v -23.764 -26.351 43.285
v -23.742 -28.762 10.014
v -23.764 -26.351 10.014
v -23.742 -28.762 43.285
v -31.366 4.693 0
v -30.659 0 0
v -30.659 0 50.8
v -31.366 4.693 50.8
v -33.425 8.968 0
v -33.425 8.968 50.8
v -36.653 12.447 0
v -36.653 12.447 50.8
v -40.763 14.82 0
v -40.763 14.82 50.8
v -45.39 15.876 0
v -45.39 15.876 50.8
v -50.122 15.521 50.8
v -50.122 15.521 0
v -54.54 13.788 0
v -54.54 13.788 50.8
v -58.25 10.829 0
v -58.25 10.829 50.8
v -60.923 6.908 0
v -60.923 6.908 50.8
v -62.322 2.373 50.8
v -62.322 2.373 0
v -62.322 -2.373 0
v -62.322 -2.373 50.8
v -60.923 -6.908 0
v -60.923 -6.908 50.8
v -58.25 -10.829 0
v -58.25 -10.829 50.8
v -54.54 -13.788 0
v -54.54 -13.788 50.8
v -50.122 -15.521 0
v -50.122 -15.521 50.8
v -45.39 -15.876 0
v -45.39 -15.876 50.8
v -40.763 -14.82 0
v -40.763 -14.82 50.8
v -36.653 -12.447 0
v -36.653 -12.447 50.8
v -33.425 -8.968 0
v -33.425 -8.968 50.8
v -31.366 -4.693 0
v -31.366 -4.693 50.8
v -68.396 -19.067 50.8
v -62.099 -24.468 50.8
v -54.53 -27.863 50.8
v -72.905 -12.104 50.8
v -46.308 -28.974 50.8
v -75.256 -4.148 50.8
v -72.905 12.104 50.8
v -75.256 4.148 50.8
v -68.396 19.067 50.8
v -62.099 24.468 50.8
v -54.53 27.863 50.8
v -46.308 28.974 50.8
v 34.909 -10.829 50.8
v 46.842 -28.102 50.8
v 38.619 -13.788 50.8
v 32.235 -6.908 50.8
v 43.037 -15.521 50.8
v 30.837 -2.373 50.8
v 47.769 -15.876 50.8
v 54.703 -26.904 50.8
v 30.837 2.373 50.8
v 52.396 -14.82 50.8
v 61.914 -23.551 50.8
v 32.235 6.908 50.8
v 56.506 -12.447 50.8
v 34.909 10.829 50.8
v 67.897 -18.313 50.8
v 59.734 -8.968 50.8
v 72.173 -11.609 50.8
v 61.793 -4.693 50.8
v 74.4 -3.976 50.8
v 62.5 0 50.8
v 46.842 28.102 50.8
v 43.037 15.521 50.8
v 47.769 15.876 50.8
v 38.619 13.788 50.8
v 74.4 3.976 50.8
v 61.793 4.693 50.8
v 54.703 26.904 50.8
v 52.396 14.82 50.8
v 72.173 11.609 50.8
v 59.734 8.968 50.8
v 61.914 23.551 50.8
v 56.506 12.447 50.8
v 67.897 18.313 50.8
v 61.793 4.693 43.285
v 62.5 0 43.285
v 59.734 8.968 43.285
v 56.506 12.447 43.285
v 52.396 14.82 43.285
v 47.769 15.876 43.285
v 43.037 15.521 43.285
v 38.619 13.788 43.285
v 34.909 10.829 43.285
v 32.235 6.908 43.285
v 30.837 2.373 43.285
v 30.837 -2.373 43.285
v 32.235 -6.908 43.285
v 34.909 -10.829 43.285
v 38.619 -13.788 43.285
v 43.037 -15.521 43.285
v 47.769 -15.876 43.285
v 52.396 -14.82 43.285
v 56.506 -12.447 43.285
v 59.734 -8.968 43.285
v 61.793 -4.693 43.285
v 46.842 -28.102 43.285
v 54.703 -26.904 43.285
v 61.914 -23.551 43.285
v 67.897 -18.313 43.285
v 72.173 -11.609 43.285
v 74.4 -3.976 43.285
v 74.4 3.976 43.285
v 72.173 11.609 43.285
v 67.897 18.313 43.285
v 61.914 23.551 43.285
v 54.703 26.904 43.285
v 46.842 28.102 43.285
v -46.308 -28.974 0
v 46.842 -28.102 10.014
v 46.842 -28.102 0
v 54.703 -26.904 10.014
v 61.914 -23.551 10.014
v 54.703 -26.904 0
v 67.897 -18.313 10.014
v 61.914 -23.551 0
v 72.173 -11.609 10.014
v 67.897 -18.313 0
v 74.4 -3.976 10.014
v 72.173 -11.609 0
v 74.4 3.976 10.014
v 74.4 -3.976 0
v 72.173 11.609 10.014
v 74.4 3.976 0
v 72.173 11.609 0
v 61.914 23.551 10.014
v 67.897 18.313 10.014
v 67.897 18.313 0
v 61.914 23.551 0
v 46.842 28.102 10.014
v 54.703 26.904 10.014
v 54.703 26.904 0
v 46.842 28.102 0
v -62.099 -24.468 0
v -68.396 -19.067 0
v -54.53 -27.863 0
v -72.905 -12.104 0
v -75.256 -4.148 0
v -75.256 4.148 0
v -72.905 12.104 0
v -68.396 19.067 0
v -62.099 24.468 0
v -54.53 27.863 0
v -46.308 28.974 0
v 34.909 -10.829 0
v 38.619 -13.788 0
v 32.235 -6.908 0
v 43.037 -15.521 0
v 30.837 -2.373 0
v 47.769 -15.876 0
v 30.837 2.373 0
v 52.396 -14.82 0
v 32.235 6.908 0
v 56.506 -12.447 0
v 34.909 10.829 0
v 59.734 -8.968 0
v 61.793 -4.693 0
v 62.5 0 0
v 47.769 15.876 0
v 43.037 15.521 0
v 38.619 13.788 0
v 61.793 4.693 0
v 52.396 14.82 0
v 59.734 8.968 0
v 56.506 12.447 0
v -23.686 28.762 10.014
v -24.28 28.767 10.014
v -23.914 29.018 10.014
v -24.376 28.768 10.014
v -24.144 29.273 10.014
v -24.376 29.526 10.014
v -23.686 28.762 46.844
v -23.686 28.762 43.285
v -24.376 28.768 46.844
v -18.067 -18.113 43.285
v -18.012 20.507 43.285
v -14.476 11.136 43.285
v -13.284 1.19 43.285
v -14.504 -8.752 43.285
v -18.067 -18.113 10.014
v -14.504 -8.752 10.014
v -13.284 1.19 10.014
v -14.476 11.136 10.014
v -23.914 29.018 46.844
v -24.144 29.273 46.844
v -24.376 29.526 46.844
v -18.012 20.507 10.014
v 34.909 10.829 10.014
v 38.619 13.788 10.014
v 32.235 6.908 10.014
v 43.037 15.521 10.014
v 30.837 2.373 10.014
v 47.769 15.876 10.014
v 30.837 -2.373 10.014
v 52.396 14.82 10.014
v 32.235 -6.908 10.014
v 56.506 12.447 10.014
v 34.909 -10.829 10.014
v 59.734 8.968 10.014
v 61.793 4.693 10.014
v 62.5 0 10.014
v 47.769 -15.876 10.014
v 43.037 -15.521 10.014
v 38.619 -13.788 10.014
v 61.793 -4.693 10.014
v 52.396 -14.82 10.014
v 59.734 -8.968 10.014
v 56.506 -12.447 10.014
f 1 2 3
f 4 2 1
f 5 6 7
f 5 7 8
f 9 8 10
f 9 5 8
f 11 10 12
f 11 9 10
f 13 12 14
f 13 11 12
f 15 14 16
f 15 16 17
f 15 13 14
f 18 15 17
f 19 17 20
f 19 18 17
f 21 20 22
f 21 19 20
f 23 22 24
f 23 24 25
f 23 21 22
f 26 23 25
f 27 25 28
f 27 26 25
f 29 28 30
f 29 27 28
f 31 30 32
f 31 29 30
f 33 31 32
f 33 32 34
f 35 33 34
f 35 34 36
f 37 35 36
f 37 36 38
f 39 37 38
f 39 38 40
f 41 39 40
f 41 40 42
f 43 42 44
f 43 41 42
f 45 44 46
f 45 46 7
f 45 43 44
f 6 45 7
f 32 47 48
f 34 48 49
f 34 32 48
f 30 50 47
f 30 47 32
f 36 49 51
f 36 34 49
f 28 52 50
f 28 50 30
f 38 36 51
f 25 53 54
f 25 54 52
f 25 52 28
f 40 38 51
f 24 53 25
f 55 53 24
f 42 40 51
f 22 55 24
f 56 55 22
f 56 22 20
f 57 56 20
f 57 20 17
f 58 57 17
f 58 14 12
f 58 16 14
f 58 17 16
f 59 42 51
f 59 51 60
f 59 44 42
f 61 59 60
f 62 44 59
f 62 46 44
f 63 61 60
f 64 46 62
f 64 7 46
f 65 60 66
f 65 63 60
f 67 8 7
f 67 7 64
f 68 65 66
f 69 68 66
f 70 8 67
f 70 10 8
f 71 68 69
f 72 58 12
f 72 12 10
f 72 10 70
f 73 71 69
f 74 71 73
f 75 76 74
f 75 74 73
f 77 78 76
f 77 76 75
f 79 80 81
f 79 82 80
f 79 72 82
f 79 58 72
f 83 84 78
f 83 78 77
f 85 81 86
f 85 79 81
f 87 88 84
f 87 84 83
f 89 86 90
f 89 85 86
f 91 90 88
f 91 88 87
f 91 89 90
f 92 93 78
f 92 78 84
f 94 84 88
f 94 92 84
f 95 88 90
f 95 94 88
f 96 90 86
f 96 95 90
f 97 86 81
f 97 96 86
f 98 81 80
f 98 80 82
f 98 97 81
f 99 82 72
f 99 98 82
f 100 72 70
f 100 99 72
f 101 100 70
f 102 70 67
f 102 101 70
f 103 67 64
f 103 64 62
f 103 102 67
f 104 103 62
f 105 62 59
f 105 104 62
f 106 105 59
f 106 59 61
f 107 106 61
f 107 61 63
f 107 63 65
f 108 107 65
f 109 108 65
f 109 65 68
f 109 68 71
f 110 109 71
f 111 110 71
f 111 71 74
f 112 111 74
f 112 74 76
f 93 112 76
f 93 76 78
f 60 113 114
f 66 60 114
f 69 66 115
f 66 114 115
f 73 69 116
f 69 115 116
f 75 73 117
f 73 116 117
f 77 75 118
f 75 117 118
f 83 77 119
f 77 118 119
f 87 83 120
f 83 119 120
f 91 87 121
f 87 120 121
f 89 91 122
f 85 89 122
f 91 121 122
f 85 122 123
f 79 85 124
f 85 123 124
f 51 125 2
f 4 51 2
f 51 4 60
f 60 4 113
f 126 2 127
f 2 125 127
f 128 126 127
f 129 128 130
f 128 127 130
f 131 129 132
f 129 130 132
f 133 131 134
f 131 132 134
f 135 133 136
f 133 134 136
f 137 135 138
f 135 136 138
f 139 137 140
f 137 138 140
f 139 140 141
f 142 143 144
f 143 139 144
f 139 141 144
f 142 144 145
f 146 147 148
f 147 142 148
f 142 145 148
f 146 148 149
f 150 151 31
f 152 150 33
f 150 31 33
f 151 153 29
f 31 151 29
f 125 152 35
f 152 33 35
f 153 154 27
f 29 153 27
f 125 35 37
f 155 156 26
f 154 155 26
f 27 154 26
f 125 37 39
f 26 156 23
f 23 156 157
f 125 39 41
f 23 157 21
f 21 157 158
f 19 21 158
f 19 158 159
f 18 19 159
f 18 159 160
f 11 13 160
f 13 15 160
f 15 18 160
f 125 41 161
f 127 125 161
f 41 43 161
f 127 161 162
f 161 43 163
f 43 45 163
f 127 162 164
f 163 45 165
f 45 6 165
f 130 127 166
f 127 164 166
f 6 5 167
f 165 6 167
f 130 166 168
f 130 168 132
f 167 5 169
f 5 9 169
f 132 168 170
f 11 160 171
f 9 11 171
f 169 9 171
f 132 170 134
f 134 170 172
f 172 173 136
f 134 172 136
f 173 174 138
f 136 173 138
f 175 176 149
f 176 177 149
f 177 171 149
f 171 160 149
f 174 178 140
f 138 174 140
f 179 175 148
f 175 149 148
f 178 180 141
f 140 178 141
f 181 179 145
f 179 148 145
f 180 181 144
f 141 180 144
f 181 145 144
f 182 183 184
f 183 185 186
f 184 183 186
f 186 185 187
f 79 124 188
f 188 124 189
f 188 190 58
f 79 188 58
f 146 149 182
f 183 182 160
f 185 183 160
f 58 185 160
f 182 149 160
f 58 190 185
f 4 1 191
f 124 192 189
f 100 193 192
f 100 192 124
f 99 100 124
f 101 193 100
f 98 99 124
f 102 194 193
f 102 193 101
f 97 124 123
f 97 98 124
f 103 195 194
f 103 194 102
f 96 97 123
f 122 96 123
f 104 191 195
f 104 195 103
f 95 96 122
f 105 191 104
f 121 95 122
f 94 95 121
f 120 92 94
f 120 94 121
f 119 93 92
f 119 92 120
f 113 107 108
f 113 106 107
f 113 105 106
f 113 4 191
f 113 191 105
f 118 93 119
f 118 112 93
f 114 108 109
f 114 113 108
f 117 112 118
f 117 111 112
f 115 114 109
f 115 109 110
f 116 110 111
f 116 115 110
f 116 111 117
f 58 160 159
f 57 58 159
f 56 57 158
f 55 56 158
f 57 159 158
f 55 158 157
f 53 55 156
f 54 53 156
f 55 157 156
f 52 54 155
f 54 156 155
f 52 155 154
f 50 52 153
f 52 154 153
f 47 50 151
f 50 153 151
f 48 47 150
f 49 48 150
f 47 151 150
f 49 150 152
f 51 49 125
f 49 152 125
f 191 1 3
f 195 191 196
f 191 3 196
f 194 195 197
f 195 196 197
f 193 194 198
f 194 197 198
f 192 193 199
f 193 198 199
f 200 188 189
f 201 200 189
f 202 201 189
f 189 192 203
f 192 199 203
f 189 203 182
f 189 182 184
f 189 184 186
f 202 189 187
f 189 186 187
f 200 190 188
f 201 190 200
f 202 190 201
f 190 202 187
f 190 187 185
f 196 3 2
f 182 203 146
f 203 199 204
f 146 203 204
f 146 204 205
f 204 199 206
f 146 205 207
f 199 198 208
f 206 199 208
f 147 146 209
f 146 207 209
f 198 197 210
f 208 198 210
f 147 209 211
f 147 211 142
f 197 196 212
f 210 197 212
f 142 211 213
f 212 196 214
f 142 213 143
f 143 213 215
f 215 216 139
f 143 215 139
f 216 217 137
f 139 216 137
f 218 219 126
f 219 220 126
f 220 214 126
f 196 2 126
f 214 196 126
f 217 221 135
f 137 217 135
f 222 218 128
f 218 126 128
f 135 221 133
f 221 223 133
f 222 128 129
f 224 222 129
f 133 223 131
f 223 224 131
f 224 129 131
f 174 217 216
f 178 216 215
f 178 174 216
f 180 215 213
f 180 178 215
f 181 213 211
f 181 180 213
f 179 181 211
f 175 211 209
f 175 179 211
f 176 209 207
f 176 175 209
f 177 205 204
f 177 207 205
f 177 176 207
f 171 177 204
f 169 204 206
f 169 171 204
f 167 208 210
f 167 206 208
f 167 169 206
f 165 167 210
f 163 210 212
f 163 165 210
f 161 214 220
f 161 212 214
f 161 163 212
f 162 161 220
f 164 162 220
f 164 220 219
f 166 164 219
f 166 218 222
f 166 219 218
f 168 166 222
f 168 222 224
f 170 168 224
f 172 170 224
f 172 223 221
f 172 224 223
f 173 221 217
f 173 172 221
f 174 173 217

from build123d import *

# Parameters (mm, degrees)
F0_R     = 15.9206607186
F1_DEPTH = 50.8
F2_DEPTH = 50.8
F3_W     = 100.2022400498
F3_H     = 33.2709047943
F4_DEPTH = 77.724
F7_DEPTH = 36.83


with BuildPart() as f1:
    # F0 (on Top) → F1 (new body)
    with BuildSketch(Plane.XY):
        with BuildLine():
            ThreePointArc((-46.3083671537, -28.9735284728), (-17.6046094791, 0), (-46.3083671537, 28.9735284728))
            ThreePointArc((-46.3083671537, 28.9735284728), (-75.5542018517, 0), (-46.3083671537, -28.9735284728))
        make_face()
        with Locations((-46.5794056654, 0)):
            Circle(F0_R, mode=Mode.SUBTRACT)
    extrude(amount=F1_DEPTH)

    # F0 (on Top) → F2 (join)
    with BuildSketch(Plane.XY):
        with BuildLine():
            Line((46.8422925338, 28.1021324953), (-46.3083671537, 28.9735284728))
            ThreePointArc((-46.3083671537, 28.9735284728), (-17.6046094791, 0), (-46.3083671537, -28.9735284728))
            Line((-46.3083671537, -28.9735284728), (46.8422925338, -28.1021324953))
            ThreePointArc((46.8422925338, -28.1021324953), (74.682767747, 0), (46.8422925338, 28.1021324953))
        make_face()
        with Locations((46.5794056654, 0)):
            Circle(F0_R, mode=Mode.SUBTRACT)
    extrude(amount=F2_DEPTH)

    # F3 (on face) → F4 (cut)
    with BuildSketch(Plane(origin=(0.26696269, -28.537830484, 0), x_dir=(0.9999562477, 0.0093542854, 0), z_dir=(0.0093542854, -0.9999562477, 0))):
        with Locations((26.0913781822, 26.6495971009)):
            Rectangle(F3_W, F3_H)
    extrude(amount=-F4_DEPTH, mode=Mode.SUBTRACT)

    # F6 (on face) → F7 (join)
    with BuildSketch(Plane.XY.offset(10.0141447037)):
        with BuildLine():
            Line((-24.3764873594, 29.5255221426), (-24.3764873594, -27.0263291895))
            ThreePointArc((-24.3764873594, -27.0263291895), (-13.2836024282, 1.2495964766), (-24.3764873594, 29.5255221426))
        make_face()
    extrude(amount=F7_DEPTH)


solid = f1.part
